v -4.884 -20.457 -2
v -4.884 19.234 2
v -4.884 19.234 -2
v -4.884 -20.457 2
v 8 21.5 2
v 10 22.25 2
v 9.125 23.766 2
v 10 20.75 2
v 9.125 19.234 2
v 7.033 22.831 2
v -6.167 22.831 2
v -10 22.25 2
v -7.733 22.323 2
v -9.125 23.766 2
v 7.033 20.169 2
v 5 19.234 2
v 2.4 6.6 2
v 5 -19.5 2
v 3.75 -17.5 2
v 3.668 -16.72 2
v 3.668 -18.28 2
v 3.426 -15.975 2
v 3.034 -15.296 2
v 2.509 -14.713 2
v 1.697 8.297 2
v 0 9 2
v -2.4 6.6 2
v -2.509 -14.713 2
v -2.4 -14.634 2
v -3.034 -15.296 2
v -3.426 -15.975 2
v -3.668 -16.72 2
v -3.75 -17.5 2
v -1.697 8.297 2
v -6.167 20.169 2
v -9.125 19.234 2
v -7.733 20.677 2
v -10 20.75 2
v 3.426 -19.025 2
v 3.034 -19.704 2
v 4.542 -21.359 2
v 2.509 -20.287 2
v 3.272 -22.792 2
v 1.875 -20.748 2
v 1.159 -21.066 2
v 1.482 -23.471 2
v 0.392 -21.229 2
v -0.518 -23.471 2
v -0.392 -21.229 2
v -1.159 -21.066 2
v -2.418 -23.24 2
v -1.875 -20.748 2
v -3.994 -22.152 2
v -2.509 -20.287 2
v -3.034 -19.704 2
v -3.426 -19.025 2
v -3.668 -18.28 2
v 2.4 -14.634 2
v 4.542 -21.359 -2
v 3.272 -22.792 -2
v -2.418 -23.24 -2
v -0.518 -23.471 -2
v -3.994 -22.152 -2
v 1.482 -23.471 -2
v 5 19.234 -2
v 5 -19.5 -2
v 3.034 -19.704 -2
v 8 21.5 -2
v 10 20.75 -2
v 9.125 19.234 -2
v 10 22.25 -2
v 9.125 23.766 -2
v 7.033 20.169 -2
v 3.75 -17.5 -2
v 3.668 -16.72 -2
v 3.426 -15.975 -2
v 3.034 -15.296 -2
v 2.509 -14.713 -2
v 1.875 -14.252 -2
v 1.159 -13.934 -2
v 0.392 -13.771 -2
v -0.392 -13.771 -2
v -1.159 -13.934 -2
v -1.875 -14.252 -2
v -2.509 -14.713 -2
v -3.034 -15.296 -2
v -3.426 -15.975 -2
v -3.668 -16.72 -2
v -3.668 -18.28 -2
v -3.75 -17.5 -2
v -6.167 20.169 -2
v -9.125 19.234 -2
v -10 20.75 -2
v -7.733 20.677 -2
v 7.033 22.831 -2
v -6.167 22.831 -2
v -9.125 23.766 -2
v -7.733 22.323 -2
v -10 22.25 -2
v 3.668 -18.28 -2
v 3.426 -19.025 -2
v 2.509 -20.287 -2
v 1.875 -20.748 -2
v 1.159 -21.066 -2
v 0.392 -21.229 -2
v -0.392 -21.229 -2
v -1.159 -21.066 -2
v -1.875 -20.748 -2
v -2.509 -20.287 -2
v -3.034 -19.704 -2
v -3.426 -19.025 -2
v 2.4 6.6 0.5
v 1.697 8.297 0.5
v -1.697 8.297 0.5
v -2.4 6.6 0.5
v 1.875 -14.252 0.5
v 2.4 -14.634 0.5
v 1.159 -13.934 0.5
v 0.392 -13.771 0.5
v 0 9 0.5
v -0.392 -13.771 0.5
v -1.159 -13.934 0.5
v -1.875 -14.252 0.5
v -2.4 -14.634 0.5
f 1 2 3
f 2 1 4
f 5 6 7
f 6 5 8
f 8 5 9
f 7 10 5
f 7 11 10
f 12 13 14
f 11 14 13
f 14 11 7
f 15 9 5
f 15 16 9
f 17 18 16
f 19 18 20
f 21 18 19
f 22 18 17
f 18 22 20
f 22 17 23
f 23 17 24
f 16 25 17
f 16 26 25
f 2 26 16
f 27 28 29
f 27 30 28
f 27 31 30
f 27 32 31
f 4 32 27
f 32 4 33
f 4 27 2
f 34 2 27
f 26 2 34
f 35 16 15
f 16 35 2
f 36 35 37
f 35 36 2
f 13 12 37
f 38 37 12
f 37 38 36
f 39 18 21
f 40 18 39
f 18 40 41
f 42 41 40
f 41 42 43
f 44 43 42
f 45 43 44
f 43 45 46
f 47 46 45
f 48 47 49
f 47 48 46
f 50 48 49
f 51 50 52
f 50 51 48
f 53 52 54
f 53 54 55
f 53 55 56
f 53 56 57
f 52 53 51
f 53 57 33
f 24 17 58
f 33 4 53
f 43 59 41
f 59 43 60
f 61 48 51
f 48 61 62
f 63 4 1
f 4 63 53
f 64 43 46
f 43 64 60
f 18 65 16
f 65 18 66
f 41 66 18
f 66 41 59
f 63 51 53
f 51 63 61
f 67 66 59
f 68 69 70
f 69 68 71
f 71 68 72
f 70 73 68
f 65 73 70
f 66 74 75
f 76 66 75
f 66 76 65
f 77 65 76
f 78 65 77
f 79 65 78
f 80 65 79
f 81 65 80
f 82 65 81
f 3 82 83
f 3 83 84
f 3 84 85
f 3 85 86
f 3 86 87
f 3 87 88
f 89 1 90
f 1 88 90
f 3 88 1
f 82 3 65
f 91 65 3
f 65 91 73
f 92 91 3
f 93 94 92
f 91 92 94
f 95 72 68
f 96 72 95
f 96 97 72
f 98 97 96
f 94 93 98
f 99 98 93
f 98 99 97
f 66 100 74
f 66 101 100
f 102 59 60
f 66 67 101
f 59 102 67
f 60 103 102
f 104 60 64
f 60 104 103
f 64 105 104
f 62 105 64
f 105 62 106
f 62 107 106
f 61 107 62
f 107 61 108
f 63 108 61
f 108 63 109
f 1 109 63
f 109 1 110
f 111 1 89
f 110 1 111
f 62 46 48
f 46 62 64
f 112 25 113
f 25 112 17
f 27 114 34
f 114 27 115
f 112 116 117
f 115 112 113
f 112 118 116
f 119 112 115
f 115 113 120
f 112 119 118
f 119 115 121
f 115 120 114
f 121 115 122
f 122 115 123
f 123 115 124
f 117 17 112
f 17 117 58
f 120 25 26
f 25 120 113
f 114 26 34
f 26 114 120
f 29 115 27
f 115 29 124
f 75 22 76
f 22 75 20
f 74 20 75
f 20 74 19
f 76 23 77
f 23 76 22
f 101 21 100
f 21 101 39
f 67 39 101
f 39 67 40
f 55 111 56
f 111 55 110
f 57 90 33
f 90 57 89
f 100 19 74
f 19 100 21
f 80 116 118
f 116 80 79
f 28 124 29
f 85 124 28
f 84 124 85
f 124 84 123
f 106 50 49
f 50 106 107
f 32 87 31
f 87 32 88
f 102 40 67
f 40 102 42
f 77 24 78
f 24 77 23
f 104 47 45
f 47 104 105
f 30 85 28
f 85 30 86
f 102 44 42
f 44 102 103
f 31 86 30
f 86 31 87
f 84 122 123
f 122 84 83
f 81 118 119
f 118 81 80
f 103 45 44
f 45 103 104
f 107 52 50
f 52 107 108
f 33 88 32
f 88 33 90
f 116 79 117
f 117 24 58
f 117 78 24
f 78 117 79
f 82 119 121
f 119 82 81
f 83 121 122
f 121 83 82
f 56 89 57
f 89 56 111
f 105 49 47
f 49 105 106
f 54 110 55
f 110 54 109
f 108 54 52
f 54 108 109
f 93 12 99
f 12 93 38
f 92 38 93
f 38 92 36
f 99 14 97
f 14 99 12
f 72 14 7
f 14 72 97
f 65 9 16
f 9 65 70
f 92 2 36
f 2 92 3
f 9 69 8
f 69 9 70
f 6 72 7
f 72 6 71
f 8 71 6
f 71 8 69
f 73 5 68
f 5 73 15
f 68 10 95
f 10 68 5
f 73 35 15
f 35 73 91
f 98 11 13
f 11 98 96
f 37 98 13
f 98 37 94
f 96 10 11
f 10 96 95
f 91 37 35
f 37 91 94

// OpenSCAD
// file: shapes/2Dshapes.scad
/*
 *  OpenSCAD 2D Shapes Library (www.openscad.org)
 *  Copyright (C) 2012 Peter Uithoven
 *
 *  License: LGPL 2.1 or later

 *  2D Shapes
 *  ngon(sides, radius, center=false);
 *  complexRoundSquare(size,rads1=[0,0], rads2=[0,0], rads3=[0,0], rads4=[0,0], center=true)
 *  roundedSquare(pos=[10,10],r=2)
 *  ellipsePart(width,height,numQuarters)
 *  donutSlice(innerSize,outerSize, start_angle, end_angle) 
 *  pieSlice(size, start_angle, end_angle) //size in radius(es)
 *  ellipse(width, height) {
*/

// Examples - (layouts.scad is required for exapmles)
// example2DShapes(); use <layouts.scad>;

module example2DShapes(){ 
	grid(105,105,true,4)
	{
		// ellipse
		ellipse(50,75);

		// part of ellipse (a number of quarters)
		ellipsePart(50,75,3);
		ellipsePart(50,75,2);
		ellipsePart(50,75,1);

		// complexRoundSquare examples
		complexRoundSquare([75,100],[20,10],[20,10],[20,10],[20,10]);
		complexRoundSquare([75,100],[0,0],[0,0],[30,50],[20,10]);
		complexRoundSquare([50,50],[10,20],[10,20],[10,20],[10,20],false);
		complexRoundSquare([100,100]);
		complexRoundSquare([100,100],rads1=[20,20],rads3=[20,20]);

		// pie slice
		pieSlice(50,0,10);
		pieSlice(50,45,190);
		pieSlice([50,20],180,270);

		// donut slice
		donutSlice(20,50,0,350);
		donutSlice(30,50,190,270);
		donutSlice([40,22],[50,30],180,270);
		donutSlice([50,20],50,180,270);
		donutSlice([20,30],[50,40],0,270);
	}
}
// end examples ----------------------

module complexRoundSquare(
	size, // Size
	rads1=[0,0], // Top left radius
	rads2=[0,0], // Top right radius
	rads3=[0,0], // Bottom right radius
	rads4=[0,0], // Bottom left radius
	center=true // center
) {
	width = size[0];
	height = size[1];
	// %square(size=[width, height],center=true);
	x1 = 0-width/2+rads1[0];
	y1 = 0-height/2+rads1[1];
	x2 = width/2-rads2[0];
	y2 = 0-height/2+rads2[1];
	x3 = width/2-rads3[0];
	y3 = height/2-rads3[1];
	x4 = 0-width/2+rads4[0];
	y4 = height/2-rads4[1];

	scs = 0.1; // straight corner size

	x = (center)? 0: width/2;
	y = (center)? 0: height/2;

	translate([x,y,0])
	hull()
	{
		// top left
		if(rads1[0] > 0 && rads1[1] > 0)
			translate([x1,y1])
			mirror([1,0])
			ellipsePart(rads1[0]*2,rads1[1]*2,1);
		else 
			translate([x1,y1])
			square(size=[scs, scs]);

		// top right
		if(rads2[0] > 0 && rads2[1] > 0)
			translate([x2,y2])
			ellipsePart(rads2[0]*2,rads2[1]*2,1);
		else
			translate([width/2-scs,0-height/2])
			square(size=[scs, scs]);

		// bottom right
		if(rads3[0] > 0 && rads3[1] > 0)
			translate([x3,y3])
			mirror([0,1])
			ellipsePart(rads3[0]*2,rads3[1]*2,1);
		else 
			translate([width/2-scs,height/2-scs])
			square(size=[scs, scs]);

		// bottom left
		if(rads4[0] > 0 && rads4[1] > 0)
			translate([x4,y4])
			rotate([0,0,-180])
			ellipsePart(rads4[0]*2,rads4[1]*2,1);
		else 
			#translate([x4,height/2-scs])
			square(size=[scs, scs]);
	}
}

module roundedSquare(pos=[10,10],r=2) {
    minkowski()
    {
        square([pos[0]-r*2,pos[1]-r*2],center=true);

		circle(r=r);
	}
}

// round shapes
// The orientation might change with the implementation of circle...
module ngon(sides, radius, center=false) {
    rotate([0, 0, 360/sides/2])
    circle(r=radius, $fn=sides, center=center);
}
module ellipsePart(width,height,numQuarters) {
    o = 1; //slight overlap to fix a bug
    difference()
    {
		ellipse(width,height);

        if(numQuarters <= 3)
            translate([0-width/2-o,0-height/2-o,0])
            square([width/2+o,height/2+o]);
        if(numQuarters <= 2)
            translate([0-width/2-o,-o,0])
            square([width/2+o,height/2+o*2]);
        if(numQuarters < 2)
            translate([-o,0,0])
            square([width/2+o*2,height/2+o]);
	}
}

module donutSlice(innerSize,outerSize, start_angle, end_angle) { 
    difference()
    {
        pieSlice(outerSize, start_angle, end_angle);
        
        if(len(innerSize) > 1) 
		    ellipse(innerSize[0]*2,innerSize[1]*2);
        else 
            circle(innerSize);
    }
}

module pieSlice(size, start_angle, end_angle) { //size in radius(es)
    rx = len(size) > 1? size[0] : size;
    ry = len(size) > 1? size[1] : size;
    trx = rx* sqrt(2) + 1;
    try = ry* sqrt(2) + 1;
    a0 = (4 * start_angle + 0 * end_angle) / 4;
    a1 = (3 * start_angle + 1 * end_angle) / 4;
    a2 = (2 * start_angle + 2 * end_angle) / 4;
    a3 = (1 * start_angle + 3 * end_angle) / 4;
    a4 = (0 * start_angle + 4 * end_angle) / 4;
    
    if(end_angle > start_angle)
    intersection() {
        if(len(size) > 1)
            ellipse(rx*2,ry*2);
        else
            circle(rx);
        polygon([
            [0,0],
            [trx * cos(a0), try * sin(a0)],
            [trx * cos(a1), try * sin(a1)],
            [trx * cos(a2), try * sin(a2)],
            [trx * cos(a3), try * sin(a3)],
            [trx * cos(a4), try * sin(a4)],
            [0,0]
        ]);
    }
}

module ellipse(width, height) {
    scale([1, height/width, 1])
    circle(r=width/2);
}
// file: boxes.scad
use <shapes/3Dshapes.scad>

// @deprecated
module roundedBox (size, radius, sidesonly, center = true)
{
    mcad_rounded_cube (size, radius, sidesonly, center);
}

// @deprecated
module roundedCube (size, r, sidesonly, center = true)
{
    mcad_rounded_cube (size, r, sidesonly, center);
}
// main file
include <boxes.scad>;
difference(){
  union(){
    difference(){
      roundedBox([10,47,4],4,true); //main body
      translate([0,-5,3])
        roundedBox([4.8,28,5],2.4,true);  //slot for servo arm
      translate([0,-17.5,-5])
      cylinder(r=3.75,h=10, $fn=30); //  Hole for servo spindle
     }

    translate([0,21.5,0])
    roundedBox([20,5,4],1.75,true); // Microswtich mount body
  }
  translate([0,21.5,-1])
  roundedBox([16,2.8,10],1.4,true);  // slot for mounting screws
}
